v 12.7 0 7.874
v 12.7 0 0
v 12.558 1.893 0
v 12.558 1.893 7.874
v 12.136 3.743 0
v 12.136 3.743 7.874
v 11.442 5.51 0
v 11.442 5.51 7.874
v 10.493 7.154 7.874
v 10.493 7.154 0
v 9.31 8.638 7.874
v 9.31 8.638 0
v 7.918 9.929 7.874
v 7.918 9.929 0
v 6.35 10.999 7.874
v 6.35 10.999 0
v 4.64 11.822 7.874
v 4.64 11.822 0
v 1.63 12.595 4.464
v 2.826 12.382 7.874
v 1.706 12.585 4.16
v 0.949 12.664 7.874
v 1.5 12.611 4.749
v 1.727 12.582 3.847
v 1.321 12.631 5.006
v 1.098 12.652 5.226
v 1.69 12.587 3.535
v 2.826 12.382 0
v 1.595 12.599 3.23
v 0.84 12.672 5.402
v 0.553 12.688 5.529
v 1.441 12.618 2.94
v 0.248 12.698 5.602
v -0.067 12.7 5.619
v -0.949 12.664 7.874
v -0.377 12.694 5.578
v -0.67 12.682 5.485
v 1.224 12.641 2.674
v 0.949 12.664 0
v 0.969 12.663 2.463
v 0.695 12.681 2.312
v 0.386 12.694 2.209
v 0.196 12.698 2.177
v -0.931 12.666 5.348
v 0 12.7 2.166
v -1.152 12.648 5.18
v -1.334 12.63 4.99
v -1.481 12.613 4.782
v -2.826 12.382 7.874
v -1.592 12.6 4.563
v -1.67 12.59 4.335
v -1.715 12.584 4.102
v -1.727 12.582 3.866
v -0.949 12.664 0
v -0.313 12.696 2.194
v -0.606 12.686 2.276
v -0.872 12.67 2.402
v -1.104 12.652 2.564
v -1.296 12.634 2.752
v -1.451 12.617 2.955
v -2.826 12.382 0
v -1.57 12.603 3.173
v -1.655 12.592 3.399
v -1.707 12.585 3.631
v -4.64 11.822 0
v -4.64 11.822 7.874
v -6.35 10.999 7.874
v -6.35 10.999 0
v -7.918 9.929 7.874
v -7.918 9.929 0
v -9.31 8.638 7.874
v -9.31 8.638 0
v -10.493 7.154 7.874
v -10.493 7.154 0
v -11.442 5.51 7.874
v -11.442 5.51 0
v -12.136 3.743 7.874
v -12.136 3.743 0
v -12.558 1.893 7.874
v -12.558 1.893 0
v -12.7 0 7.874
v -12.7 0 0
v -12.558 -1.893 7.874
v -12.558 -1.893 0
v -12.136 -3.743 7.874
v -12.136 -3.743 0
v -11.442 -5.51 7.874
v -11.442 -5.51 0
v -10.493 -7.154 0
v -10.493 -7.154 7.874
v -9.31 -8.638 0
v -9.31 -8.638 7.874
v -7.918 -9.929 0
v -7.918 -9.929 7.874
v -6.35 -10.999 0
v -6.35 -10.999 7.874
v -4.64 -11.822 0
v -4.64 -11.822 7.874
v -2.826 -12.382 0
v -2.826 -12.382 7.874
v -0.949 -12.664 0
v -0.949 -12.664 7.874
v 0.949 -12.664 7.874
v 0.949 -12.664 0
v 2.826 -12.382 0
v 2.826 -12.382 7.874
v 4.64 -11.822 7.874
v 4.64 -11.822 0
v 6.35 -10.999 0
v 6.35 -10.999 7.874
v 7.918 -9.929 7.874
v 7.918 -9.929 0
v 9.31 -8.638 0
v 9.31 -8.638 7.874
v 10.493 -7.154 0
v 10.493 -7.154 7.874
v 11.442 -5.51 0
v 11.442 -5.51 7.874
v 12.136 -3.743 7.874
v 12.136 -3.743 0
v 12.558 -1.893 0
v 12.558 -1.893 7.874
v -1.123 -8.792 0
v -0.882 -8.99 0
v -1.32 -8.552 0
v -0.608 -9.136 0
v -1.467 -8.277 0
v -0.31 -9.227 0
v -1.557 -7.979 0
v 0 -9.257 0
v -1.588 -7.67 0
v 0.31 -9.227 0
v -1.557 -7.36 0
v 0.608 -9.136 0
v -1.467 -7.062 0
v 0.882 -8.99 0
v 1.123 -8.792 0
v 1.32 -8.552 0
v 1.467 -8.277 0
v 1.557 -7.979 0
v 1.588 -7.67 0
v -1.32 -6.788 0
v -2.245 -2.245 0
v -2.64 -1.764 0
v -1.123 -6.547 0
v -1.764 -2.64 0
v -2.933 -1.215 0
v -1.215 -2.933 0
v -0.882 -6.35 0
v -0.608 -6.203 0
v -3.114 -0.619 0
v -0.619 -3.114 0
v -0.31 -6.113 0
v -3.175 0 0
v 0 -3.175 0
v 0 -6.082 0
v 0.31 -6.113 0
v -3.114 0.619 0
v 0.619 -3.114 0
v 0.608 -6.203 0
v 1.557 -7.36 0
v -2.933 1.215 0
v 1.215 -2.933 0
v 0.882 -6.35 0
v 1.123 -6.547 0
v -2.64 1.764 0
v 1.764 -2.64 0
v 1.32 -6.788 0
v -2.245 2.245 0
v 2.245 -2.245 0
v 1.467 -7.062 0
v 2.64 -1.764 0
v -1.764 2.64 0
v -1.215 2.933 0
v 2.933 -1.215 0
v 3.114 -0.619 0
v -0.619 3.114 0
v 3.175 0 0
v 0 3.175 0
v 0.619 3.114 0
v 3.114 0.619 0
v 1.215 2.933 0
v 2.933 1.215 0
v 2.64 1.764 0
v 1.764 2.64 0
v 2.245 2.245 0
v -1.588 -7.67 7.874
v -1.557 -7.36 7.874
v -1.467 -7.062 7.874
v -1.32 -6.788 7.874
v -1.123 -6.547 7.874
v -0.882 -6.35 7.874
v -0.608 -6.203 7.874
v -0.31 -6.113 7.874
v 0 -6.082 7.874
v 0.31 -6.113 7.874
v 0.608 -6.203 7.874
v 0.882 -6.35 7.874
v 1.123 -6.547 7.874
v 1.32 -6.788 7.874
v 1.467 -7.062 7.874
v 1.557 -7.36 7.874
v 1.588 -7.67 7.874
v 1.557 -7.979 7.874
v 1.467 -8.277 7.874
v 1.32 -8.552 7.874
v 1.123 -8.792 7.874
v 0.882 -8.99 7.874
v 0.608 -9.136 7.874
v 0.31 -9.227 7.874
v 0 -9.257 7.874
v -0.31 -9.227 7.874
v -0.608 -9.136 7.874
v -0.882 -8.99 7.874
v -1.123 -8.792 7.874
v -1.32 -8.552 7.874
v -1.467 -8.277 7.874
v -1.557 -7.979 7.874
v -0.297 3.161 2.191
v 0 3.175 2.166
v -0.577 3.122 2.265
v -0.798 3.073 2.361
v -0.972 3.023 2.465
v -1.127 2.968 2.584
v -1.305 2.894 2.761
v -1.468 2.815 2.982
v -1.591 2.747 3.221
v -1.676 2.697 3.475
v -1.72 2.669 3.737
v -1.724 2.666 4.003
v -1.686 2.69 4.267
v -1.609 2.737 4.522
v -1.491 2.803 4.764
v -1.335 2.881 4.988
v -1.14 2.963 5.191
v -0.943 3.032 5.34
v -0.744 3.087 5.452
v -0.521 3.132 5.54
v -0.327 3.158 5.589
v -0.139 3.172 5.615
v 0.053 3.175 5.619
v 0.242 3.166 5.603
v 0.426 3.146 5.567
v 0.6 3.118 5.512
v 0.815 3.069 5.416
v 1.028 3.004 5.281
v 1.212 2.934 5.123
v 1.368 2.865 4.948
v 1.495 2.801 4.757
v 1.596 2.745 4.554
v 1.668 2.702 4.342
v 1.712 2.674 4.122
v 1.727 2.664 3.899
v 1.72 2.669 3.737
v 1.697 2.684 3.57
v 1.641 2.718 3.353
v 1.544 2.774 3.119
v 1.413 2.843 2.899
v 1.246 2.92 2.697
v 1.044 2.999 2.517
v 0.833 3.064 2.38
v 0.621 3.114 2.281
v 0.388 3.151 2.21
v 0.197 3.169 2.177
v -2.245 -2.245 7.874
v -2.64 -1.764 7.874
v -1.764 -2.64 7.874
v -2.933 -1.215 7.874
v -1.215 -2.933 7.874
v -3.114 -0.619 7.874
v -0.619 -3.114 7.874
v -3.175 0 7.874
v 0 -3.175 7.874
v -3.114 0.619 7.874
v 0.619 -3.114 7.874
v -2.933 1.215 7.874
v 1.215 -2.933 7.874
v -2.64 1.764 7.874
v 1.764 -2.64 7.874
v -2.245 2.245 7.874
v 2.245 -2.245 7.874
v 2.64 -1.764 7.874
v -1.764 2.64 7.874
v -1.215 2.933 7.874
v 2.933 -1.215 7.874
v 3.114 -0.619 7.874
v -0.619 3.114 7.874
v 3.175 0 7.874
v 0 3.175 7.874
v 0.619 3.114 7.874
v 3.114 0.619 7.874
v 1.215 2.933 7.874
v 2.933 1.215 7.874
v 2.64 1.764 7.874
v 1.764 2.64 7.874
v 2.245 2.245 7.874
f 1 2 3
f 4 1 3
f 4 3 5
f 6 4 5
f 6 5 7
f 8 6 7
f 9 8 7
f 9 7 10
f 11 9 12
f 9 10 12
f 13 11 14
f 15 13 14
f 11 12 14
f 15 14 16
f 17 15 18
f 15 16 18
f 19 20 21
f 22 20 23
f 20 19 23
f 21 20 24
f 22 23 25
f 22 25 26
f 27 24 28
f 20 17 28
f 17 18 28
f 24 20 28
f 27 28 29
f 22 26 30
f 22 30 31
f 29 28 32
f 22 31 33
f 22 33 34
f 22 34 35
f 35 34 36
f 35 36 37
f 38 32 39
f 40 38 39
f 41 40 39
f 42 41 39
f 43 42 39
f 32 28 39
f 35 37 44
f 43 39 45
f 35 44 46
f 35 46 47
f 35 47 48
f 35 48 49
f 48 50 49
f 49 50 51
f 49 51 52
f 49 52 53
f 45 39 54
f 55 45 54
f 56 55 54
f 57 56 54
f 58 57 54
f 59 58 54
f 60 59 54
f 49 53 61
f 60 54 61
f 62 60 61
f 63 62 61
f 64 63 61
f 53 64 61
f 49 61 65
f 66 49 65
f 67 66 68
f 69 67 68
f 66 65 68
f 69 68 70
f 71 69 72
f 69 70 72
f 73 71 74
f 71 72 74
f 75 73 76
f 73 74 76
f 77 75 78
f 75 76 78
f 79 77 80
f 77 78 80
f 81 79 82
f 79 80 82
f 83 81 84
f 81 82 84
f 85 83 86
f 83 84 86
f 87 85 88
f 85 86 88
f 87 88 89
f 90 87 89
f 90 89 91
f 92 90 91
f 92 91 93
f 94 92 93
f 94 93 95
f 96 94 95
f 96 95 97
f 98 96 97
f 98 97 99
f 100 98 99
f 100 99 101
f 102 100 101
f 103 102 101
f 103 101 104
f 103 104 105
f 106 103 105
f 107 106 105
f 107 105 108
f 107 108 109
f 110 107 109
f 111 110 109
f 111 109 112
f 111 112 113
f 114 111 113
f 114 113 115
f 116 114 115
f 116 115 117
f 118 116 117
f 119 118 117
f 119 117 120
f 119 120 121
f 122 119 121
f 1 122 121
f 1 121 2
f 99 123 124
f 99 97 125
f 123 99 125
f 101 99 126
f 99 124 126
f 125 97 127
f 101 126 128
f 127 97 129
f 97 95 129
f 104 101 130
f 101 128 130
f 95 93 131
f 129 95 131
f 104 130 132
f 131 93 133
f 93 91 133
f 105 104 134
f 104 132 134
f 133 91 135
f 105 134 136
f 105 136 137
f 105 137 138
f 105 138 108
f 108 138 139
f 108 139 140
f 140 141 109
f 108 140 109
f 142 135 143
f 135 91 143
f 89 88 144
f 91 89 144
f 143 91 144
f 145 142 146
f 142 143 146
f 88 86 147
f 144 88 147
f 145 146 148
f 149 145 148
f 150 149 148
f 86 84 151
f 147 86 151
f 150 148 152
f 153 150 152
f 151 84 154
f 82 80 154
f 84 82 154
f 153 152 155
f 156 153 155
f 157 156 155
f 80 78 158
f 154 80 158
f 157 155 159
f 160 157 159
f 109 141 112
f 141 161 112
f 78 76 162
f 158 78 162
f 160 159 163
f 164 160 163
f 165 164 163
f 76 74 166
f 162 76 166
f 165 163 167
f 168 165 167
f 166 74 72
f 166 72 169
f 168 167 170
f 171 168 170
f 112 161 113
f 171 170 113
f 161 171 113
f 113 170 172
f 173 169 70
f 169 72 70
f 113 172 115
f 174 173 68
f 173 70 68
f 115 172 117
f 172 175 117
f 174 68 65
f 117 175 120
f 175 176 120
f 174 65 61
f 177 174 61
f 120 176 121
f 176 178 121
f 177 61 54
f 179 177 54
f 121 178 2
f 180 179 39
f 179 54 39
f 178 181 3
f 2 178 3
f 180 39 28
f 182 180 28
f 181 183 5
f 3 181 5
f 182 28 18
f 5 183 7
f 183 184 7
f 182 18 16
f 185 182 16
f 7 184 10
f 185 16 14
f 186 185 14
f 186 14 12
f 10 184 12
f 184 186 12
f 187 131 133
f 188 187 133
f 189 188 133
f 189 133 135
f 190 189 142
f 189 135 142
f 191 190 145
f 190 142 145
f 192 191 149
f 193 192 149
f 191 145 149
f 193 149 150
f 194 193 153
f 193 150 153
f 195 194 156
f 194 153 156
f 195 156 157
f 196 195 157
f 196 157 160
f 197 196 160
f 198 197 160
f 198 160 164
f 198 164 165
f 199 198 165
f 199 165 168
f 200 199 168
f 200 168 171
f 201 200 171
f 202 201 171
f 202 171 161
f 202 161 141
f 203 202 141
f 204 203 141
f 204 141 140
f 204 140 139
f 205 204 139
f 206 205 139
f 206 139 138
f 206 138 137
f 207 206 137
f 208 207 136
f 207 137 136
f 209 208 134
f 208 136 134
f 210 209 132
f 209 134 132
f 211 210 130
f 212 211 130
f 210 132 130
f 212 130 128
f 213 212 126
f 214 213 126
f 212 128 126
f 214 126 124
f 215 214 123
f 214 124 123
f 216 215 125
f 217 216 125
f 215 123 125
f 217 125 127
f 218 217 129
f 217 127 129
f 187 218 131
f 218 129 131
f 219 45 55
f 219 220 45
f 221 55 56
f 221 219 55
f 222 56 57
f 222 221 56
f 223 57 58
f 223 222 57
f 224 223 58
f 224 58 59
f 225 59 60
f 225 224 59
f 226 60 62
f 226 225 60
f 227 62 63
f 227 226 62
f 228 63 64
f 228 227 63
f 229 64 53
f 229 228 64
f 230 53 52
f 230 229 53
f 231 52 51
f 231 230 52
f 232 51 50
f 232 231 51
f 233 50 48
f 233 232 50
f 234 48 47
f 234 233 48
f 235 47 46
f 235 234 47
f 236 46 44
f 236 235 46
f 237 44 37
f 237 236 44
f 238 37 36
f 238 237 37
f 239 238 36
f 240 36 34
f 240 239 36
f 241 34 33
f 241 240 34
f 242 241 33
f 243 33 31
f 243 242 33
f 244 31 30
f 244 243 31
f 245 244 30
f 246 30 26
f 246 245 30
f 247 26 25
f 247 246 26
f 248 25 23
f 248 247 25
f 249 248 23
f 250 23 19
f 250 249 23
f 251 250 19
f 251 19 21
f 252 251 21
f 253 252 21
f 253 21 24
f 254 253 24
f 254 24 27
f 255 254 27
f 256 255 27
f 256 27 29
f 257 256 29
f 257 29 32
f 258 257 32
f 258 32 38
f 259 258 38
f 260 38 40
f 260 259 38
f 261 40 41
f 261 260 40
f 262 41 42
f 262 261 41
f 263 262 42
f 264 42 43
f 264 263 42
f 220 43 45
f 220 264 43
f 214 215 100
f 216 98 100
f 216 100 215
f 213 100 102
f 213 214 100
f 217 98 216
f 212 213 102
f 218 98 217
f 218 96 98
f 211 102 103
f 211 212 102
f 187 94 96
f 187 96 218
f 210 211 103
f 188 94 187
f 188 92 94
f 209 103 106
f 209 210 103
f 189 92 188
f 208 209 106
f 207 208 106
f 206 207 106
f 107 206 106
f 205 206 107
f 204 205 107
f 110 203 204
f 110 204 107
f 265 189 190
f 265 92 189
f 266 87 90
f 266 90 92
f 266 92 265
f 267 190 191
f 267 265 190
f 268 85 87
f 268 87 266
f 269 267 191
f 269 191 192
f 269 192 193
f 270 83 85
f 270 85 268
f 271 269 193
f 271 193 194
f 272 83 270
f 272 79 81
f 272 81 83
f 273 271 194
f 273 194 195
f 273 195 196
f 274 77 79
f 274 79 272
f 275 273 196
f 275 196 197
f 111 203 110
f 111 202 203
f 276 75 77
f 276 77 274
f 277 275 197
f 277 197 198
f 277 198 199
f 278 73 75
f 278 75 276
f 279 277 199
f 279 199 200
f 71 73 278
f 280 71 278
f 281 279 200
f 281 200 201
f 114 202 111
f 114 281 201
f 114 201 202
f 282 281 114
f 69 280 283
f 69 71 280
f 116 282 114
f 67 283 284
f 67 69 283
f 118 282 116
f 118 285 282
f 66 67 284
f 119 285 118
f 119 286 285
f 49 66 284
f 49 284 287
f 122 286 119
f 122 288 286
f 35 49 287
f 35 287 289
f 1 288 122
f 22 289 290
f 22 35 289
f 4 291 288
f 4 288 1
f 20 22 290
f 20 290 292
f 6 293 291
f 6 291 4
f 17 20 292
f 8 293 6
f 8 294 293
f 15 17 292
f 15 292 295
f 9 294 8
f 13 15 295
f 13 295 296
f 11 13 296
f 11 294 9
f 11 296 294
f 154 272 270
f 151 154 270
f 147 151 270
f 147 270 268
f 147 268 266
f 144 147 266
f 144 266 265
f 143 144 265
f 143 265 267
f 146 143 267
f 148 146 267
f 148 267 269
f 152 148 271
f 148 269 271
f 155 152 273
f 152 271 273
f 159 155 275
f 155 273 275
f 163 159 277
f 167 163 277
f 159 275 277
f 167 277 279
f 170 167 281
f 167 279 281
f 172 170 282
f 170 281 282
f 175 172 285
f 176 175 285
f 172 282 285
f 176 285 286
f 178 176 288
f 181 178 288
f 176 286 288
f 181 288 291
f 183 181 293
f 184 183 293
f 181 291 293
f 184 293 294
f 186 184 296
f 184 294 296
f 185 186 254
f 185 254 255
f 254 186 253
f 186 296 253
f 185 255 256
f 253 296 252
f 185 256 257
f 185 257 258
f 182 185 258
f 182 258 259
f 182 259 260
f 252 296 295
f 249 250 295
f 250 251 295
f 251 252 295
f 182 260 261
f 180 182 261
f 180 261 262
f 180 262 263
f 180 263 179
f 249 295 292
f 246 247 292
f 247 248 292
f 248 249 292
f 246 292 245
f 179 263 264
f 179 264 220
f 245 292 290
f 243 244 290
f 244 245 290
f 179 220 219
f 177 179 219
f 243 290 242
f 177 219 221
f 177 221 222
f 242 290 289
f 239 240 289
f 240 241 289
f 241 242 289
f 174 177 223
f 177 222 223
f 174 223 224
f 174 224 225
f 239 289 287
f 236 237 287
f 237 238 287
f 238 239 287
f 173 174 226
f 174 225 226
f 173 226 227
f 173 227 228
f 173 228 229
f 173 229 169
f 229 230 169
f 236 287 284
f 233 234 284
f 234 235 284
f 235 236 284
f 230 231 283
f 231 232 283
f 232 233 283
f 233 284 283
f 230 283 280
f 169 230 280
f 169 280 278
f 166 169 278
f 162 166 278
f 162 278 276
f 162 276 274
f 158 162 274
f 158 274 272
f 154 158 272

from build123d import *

# Parameters (mm, degrees)
SKETCH1_R                  = 12.7
BOSS_EXTRUDE1_DEPTH        = 7.874
F_1_4_0_2500_DOWEL_HOLE1_D = 6.35
F_1_8_0_1250_DOWEL_HOLE1_D = 3.175


with BuildPart() as part:
    # Sketch1 → Boss-Extrude1 (new body)
    with BuildSketch(Plane.XY):
        Circle(SKETCH1_R)
    extrude(amount=BOSS_EXTRUDE1_DEPTH)

    # 1/4 (0.2500) Dowel Hole1 (through all)
    with Locations(Plane(origin=(0, 0, 0), x_dir=(1, 0, 0), z_dir=(0, 0, -1))):
        with Locations((0, 0)):
            Hole(F_1_4_0_2500_DOWEL_HOLE1_D / 2)

    # 1/8 (0.1250) Dowel Hole1 (through all)
    with Locations(Plane.XY.offset(7.874)):
        with Locations((0, -7.669668031)):
            Hole(F_1_8_0_1250_DOWEL_HOLE1_D / 2)

    # Sketch7 → #8-32 Tapped Hole1 (revolve, cut)
    with BuildSketch(Plane(origin=(0, 0, 3.892930906), x_dir=(0, 0, -1), z_dir=(1, 0, 0))):
        Polygon((0, 0), (0, 13.97), (1.7272, 12.932193539), (1.7272, 0), align=None)
    revolve(axis=Axis((0, -6.35, 3.892930906), (0, 1, 0)), mode=Mode.SUBTRACT)


solid = part.part
